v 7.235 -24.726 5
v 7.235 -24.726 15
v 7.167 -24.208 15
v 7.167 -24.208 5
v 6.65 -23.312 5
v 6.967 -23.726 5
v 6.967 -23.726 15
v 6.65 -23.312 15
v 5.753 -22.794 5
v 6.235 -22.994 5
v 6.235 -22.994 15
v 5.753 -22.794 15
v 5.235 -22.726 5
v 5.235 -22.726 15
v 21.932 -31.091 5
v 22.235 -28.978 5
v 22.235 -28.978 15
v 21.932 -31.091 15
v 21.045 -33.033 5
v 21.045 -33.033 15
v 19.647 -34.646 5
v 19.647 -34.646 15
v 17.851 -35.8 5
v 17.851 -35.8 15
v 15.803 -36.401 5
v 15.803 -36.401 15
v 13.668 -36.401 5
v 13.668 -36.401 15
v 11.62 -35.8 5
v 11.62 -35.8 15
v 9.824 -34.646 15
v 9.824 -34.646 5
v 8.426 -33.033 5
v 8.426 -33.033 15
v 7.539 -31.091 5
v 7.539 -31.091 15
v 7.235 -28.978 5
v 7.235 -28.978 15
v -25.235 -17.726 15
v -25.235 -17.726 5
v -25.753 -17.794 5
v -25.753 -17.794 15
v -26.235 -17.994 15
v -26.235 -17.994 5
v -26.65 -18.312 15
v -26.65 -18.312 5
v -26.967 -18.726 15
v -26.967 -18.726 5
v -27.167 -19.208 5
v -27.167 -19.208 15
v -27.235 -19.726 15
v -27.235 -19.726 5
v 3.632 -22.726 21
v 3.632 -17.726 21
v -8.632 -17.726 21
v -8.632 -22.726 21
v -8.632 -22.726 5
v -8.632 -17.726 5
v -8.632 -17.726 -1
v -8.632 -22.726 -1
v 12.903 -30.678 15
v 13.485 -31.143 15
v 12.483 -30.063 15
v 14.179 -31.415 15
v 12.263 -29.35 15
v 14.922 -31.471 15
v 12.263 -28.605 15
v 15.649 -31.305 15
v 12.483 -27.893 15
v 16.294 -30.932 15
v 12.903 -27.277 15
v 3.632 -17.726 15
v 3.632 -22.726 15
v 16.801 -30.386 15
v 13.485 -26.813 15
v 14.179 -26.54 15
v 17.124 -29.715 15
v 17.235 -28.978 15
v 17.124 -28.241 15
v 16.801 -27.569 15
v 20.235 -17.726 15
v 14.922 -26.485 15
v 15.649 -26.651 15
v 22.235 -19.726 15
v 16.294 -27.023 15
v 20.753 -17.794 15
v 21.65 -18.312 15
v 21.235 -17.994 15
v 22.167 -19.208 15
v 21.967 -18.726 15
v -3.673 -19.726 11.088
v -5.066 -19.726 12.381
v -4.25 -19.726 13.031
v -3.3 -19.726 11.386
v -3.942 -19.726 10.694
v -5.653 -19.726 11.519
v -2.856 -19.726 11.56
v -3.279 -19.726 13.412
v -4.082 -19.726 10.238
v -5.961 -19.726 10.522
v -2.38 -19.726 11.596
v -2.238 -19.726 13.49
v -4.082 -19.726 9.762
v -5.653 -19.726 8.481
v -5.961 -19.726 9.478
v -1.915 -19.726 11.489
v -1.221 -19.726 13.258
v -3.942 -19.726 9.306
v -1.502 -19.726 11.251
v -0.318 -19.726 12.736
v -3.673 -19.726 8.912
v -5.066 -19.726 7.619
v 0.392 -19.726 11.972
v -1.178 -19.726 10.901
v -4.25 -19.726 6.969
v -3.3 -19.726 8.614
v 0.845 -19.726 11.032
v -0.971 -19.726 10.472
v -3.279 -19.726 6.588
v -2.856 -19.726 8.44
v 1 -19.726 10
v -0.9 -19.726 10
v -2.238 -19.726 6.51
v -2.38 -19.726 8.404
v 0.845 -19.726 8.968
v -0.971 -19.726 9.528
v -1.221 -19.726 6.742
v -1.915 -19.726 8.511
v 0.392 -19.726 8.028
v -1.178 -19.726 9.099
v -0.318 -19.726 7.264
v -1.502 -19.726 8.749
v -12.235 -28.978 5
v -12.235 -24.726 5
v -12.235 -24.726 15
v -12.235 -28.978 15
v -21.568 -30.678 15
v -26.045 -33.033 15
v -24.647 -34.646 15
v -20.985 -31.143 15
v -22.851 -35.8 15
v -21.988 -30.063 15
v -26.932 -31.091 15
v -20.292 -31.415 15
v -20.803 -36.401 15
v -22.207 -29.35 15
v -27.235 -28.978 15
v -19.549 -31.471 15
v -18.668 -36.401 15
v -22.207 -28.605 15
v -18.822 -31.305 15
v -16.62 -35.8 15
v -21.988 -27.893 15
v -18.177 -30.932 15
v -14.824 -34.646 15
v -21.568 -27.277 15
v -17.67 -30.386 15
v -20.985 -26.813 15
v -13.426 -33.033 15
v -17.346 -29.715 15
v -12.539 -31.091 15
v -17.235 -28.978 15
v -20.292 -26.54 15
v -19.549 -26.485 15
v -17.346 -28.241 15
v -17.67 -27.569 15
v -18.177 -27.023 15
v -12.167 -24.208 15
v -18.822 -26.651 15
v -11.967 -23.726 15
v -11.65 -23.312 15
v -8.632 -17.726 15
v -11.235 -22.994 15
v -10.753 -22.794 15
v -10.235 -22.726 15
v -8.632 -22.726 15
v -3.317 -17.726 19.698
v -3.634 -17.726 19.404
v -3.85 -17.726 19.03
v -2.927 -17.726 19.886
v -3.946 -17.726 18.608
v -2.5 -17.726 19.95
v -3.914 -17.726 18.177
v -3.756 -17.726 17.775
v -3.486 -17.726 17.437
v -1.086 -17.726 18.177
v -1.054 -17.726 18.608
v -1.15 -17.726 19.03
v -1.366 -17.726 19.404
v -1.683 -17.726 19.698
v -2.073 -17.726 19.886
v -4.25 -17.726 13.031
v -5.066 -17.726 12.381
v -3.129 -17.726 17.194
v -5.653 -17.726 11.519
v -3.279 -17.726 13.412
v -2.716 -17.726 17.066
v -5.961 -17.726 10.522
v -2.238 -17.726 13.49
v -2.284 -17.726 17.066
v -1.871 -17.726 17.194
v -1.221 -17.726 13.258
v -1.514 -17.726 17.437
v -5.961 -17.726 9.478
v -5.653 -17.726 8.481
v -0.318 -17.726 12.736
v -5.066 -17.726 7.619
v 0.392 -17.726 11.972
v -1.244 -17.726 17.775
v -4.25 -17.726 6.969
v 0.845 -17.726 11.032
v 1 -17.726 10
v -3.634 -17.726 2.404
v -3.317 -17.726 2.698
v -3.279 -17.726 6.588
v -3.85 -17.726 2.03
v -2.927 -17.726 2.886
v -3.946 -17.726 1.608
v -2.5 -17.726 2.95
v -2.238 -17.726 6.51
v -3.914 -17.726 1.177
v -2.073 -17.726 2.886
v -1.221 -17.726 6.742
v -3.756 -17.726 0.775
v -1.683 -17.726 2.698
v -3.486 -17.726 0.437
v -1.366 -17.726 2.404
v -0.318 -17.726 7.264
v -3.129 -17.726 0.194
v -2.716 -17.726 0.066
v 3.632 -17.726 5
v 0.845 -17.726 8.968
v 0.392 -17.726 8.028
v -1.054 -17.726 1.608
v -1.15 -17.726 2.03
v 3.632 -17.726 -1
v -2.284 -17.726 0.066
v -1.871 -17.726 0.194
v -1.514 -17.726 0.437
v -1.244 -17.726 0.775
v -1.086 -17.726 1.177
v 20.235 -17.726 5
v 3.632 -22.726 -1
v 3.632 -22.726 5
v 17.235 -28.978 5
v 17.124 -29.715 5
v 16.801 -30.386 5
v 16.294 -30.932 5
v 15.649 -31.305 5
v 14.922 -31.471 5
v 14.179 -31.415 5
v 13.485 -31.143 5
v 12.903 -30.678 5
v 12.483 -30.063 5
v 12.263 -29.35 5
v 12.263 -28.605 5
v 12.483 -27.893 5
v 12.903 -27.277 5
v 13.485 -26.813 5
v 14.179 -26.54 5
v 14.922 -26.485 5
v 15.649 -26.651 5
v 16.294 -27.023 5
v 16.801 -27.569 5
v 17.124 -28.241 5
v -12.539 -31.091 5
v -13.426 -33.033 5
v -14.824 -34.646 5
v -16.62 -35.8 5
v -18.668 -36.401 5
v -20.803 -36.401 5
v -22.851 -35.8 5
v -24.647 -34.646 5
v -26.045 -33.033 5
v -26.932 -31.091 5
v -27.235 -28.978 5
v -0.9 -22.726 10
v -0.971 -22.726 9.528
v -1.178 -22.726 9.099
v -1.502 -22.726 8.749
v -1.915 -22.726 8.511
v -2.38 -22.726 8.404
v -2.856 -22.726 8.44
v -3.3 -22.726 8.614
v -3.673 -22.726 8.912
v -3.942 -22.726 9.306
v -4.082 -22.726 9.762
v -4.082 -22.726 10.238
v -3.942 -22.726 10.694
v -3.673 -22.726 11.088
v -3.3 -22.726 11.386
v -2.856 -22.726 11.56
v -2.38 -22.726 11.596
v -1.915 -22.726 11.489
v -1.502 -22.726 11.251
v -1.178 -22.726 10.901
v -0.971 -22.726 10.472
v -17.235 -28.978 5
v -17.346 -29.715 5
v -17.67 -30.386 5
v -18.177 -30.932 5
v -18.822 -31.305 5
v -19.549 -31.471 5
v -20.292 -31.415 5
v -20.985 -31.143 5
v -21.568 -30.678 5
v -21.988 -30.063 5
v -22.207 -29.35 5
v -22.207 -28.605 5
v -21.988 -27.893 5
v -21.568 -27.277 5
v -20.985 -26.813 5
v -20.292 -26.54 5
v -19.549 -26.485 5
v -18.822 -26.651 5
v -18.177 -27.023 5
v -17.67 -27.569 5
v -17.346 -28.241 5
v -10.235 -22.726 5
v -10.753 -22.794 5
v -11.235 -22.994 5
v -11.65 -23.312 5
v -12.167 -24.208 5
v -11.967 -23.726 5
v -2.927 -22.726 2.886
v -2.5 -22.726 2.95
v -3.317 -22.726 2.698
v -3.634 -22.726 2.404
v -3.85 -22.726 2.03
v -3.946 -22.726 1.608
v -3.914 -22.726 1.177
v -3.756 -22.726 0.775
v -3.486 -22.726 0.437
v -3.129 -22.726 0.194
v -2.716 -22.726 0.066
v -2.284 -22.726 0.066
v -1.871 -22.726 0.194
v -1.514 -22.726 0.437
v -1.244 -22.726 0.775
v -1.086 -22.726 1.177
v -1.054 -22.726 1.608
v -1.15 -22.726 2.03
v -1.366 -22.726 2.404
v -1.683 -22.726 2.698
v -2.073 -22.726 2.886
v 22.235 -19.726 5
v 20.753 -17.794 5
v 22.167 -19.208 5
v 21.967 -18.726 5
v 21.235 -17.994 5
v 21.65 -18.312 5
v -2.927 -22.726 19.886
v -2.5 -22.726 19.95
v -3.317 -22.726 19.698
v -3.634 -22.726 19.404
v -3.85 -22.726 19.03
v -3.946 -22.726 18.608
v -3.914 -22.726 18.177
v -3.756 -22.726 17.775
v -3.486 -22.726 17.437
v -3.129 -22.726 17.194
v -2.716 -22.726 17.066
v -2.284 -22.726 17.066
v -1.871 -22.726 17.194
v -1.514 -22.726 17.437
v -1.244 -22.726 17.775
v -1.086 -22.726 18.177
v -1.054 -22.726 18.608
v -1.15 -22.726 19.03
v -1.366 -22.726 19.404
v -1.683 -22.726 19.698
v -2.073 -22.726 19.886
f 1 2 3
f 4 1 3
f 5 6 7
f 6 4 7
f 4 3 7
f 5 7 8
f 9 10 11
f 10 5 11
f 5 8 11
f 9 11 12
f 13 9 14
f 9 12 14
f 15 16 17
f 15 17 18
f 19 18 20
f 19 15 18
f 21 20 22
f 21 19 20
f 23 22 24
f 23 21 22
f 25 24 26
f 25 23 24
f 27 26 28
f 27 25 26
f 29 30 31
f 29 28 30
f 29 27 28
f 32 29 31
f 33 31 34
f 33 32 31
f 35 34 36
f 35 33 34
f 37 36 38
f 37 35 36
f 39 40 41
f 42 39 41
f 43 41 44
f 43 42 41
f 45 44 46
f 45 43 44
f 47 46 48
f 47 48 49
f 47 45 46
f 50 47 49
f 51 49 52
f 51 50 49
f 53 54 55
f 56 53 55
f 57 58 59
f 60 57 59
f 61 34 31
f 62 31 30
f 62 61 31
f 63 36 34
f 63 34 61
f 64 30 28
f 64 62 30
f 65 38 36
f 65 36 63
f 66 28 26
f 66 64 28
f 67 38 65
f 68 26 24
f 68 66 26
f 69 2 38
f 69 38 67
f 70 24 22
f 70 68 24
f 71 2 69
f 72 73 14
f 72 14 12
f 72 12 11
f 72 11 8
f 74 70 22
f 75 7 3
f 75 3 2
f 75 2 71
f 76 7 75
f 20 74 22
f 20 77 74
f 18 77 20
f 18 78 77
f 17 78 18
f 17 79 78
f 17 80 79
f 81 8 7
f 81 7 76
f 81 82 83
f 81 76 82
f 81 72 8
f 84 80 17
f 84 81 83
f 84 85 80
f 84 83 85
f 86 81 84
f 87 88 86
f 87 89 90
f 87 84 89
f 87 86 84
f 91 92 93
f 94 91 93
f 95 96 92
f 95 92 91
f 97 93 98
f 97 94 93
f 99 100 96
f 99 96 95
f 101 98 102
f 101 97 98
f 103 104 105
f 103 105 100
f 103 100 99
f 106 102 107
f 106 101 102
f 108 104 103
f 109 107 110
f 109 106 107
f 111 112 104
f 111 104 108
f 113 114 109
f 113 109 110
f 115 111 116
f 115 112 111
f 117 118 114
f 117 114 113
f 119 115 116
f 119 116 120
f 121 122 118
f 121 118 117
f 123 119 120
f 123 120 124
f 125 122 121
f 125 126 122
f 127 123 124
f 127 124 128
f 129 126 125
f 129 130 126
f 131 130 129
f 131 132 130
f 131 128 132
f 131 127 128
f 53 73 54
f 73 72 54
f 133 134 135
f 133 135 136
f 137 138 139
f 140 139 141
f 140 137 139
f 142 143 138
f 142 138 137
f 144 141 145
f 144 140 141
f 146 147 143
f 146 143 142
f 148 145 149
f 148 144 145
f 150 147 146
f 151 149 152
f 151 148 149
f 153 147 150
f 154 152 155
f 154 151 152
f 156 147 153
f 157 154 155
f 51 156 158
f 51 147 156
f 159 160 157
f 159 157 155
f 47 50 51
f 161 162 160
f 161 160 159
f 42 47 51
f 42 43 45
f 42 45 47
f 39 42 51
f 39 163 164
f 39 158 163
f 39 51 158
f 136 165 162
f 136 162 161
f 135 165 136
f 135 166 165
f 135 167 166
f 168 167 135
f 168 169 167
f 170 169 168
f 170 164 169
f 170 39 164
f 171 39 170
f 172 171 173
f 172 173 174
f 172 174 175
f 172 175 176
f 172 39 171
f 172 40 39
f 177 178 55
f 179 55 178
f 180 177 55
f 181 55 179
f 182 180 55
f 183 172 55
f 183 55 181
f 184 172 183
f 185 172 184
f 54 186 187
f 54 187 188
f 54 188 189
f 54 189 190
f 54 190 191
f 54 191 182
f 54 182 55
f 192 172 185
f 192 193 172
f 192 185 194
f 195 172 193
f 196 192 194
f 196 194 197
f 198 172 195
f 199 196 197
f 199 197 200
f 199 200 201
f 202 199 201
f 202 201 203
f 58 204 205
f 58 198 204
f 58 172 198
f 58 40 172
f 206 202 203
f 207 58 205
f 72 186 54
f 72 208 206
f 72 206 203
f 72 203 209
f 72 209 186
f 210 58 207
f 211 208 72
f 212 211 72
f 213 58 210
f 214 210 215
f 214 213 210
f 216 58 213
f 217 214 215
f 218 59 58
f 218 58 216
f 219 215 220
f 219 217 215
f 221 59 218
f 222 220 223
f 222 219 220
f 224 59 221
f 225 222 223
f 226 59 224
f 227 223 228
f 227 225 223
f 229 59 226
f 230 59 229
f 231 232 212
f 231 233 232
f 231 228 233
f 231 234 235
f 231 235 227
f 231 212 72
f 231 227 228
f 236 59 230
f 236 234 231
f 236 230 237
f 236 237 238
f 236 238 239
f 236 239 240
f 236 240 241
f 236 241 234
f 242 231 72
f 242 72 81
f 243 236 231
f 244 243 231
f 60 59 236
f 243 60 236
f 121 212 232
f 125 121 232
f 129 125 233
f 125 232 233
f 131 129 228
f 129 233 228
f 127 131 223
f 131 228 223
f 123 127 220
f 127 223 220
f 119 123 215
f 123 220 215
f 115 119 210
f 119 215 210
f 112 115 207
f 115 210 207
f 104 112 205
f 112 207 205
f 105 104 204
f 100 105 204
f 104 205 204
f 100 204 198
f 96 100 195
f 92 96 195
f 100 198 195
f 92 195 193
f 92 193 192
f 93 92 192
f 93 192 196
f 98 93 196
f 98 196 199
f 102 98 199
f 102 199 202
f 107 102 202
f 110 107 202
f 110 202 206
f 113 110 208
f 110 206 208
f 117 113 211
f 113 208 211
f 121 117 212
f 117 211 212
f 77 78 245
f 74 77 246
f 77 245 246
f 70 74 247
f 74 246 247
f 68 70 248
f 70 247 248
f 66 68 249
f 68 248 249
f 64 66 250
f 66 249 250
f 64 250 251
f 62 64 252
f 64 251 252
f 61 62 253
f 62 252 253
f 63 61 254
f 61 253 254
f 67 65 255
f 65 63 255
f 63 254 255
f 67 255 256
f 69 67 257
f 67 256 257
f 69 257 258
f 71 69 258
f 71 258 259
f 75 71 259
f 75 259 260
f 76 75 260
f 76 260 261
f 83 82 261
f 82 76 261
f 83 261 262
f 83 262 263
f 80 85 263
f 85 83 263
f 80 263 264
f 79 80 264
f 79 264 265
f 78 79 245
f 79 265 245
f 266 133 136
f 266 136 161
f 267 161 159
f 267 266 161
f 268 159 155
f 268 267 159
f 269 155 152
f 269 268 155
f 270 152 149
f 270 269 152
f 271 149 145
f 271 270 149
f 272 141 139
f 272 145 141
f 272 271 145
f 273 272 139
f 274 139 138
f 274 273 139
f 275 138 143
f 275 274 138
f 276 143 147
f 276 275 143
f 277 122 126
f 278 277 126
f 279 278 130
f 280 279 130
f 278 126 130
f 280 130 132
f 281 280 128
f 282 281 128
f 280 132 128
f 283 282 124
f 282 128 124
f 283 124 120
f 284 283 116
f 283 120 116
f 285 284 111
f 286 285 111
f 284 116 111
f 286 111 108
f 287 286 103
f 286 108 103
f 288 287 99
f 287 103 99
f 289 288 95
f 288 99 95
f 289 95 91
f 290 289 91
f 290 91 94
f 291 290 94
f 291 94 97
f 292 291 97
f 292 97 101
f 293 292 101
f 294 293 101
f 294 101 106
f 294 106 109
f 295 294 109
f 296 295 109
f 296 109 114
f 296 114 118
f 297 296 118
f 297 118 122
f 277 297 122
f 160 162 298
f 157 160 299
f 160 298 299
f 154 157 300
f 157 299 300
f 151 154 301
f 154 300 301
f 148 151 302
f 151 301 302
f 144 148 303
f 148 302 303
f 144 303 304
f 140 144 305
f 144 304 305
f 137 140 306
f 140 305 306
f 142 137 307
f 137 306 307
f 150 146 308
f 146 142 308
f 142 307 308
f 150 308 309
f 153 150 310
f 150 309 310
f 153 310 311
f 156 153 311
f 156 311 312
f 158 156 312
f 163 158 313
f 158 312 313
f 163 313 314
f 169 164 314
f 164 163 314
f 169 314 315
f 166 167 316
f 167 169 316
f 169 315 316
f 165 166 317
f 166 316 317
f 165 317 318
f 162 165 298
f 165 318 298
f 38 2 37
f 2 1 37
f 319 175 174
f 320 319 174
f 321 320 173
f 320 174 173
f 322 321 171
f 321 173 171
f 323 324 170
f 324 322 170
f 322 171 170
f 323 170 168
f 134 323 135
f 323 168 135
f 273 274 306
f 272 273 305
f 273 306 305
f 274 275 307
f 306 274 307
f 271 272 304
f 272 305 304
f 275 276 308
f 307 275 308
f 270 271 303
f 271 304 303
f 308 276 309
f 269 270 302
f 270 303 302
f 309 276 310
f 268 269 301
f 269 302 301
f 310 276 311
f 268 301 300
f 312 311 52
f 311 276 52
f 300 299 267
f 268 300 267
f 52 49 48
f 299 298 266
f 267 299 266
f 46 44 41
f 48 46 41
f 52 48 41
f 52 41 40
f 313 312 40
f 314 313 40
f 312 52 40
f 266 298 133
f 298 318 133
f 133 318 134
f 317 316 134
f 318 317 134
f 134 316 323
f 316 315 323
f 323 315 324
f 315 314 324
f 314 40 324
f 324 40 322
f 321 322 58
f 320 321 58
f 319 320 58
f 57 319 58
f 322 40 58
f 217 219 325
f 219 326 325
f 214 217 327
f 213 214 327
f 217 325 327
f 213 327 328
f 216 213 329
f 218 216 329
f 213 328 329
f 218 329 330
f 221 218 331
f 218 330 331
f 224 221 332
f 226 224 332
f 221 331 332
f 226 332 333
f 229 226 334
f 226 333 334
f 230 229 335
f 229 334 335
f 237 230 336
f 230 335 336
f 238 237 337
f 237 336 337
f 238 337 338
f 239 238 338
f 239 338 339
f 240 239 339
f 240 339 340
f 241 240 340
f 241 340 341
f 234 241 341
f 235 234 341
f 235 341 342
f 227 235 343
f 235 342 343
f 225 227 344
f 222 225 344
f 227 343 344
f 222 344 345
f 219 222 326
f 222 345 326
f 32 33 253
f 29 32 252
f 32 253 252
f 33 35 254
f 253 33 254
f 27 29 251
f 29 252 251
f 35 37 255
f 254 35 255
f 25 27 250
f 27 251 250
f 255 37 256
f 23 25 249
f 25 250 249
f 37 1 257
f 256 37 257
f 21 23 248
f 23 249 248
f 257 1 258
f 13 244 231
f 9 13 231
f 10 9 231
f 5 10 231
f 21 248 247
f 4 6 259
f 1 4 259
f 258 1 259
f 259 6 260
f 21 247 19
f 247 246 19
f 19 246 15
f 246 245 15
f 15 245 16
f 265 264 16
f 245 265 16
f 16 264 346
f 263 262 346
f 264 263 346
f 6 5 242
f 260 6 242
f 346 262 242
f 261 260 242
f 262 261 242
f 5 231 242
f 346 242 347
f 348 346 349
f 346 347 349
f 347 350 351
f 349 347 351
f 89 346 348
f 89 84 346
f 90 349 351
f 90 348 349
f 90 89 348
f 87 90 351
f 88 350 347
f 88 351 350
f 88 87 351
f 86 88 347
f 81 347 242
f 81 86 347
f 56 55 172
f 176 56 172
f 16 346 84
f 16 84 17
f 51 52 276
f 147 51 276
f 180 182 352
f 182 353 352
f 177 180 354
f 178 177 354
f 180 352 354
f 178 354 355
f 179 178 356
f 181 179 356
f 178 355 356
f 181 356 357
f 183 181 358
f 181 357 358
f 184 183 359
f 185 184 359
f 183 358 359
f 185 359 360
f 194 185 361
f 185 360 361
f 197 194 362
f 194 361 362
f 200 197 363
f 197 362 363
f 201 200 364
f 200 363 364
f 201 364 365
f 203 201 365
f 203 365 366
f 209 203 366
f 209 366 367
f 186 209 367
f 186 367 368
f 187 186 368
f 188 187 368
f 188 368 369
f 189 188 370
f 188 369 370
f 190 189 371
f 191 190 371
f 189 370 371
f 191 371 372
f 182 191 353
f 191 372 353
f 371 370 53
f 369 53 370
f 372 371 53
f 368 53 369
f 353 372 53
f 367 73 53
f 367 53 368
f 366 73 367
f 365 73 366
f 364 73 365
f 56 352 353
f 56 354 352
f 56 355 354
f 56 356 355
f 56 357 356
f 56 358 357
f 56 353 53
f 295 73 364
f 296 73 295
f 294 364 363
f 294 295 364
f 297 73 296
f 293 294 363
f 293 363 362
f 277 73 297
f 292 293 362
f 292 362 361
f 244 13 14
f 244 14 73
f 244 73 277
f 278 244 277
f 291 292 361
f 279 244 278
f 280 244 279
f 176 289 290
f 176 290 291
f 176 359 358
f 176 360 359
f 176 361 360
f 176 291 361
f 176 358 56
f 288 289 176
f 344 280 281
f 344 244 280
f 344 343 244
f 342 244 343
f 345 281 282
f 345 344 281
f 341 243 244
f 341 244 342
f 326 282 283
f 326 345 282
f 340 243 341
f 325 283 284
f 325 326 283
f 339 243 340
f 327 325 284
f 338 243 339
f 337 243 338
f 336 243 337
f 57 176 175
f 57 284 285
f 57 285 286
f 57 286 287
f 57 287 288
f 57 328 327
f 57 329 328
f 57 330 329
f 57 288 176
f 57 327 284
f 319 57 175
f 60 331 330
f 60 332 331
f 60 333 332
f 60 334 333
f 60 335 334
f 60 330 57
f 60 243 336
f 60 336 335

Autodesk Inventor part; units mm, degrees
ref_plane "YZ Plane" through (0, 0, 0) normal (1, 0, 0) x (0, 1, 0)
ref_plane "XZ Plane" through (0, 0, 0) normal (0, 1, 0) x (-1, 0, 0)
ref_plane "XY Plane" through (0, 0, 0) normal (0, 0, 1) x (1, 0, 0)
sketch "Szkic1" plane through (0, 0, 0) normal (0, 0, 1) x (1, 0, 0)
  line L0 (-2.5, 0) -> (-27.5, 0)
  line L1 (-27.5, 0) -> (-19.7354, -28.9778)
  line L2 (-27.5, 0) -> (2.5, 0) construction
  line L3 (-27.5, 0) -> (-37.3351, 36.7052)
  line L4 (-27.5, 0) -> (10.5, 0) construction
  line L5 (-37.3351, 36.7052) -> (-37.3351, 54.7052)
  line L6 (-37.3351, 54.7052) -> (-2.5, 54.7052)
  line L7 (-37.3351, 54.7052) -> (-27.3351, 72.0257)
  line L8 (-37.3351, 54.7052) -> (-17.3351, 54.7052) construction
  line L9 (-37.3351, 54.7052) -> (-27.3351, 37.3847)
  line L10 (-37.3351, 54.7052) -> (-17.3351, 54.7052) construction
  circle A0 centre (-27.5, 0) radius 1.5
  line L11 (-2.5, 0) -> (-2.5, -12)
  line L12 (-2.5, -12) -> (-27.5, -12)
  line L13 (-27.5, -12) -> (-19.7354, -28.9778)
  line L14 (-27.5, -12) -> (-48.0171, 32.862)
  line L15 (-48.0171, 32.862) -> (-51.0127, 50.611)
  line L16 (-48.0171, 32.862) -> (-30.0171, 32.862) construction
  line L17 (-51.0127, 50.611) -> (-38.2696, 35.1962)
  line L18 (-51.0127, 50.611) -> (-31.0127, 50.611) construction
  line L19 (-51.0127, 50.611) -> (-44.0347, 69.3542)
  line L20 (-51.0127, 50.611) -> (-31.0127, 50.611) construction
  circle A1 centre (-27.5, -12) radius 1.5
  line L21 (-19.7354, -28.9778) -> (0, -28.9778)
  circle A2 centre (-19.7354, -28.9778) radius 2.5
  line L22 (-22.2354, -28.9778) -> (-27.2354, -28.9778)
  line L23 (17.2354, -28.9778) -> (22.2354, -28.9778)
  circle A3 centre (14.7354, -28.9778) radius 2.5
  line L24 (22.5, -12) -> (14.7354, -28.9778)
  line L25 (14.7354, -28.9778) -> (0, -28.9778)
  line L26 (-2.5, -12) -> (22.5, -12)
  line L27 (32.3351, 54.7052) -> (22.3351, 37.3847)
  line L28 (32.3351, 36.7052) -> (32.3351, 54.7052)
  line L29 (46.0127, 50.611) -> (33.2696, 35.1962)
  line L30 (43.0171, 32.862) -> (46.0127, 50.611)
  line L31 (43.0171, 32.862) -> (25.0171, 32.862) construction
  circle A4 centre (22.5, 0) radius 1.5
  line L32 (22.5, 0) -> (32.3351, 36.7052)
  circle A5 centre (22.5, -12) radius 1.5
  line L33 (22.5, -12) -> (43.0171, 32.862)
  line L34 (-2.5, 0) -> (22.5, 0)
  line L35 (22.5, 0) -> (14.7354, -28.9778)
  line L36 (22.5, 0) -> (-7.5, 0) construction
  line L37 (22.5, 0) -> (-15.5, 0) construction
  line L38 (46.0127, 50.611) -> (26.0127, 50.611) construction
  line L39 (46.0127, 50.611) -> (26.0127, 50.611) construction
  line L40 (32.3351, 54.7052) -> (12.3351, 54.7052) construction
  line L41 (32.3351, 54.7052) -> (12.3351, 54.7052) construction
  line L42 (32.3351, 54.7052) -> (-2.5, 54.7052)
  line L43 (46.0127, 50.611) -> (39.0347, 69.3542)
  line L44 (32.3351, 54.7052) -> (22.3351, 72.0257)
  line L45 (-19.7354, -31.4778) -> (-19.7354, -36.4778)
  line L46 (-19.7354, -36.4778) -> (0, -36.4778)
  line L47 (-19.7354, -36.4778) -> (-22.2354, -36.4778)
  line L48 (-27.2354, -28.9778) -> (-27.2354, -31.4778)
  line L49 (-19.7354, -26.4778) -> (-19.7354, -21.4778)
  line L50 (-19.7354, -21.4778) -> (-22.2354, -21.4778)
  line L51 (-27.2354, -26.4778) -> (-27.2354, -28.9778)
  line L52 (-19.7354, -21.4778) -> (0, -21.4778)
  line L53 (22.5, 0) -> (14.7354, -28.9778)
  line L54 (22.5, -12) -> (14.7354, -28.9778)
  line L55 (14.7354, -28.9778) -> (-5, -28.9778)
  circle A6 centre (14.7354, -28.9778) radius 2.5
  line L56 (17.2354, -28.9778) -> (22.2354, -28.9778)
  line L57 (-19.7354, -28.9778) -> (-5, -28.9778)
  line L58 (14.7354, -31.4778) -> (14.7354, -36.4778)
  line L59 (14.7354, -36.4778) -> (-5, -36.4778)
  line L60 (14.7354, -36.4778) -> (17.2354, -36.4778)
  line L61 (22.2354, -28.9778) -> (22.2354, -31.4778)
  line L62 (14.7354, -26.4778) -> (14.7354, -21.4778)
  line L63 (14.7354, -21.4778) -> (17.2354, -21.4778)
  line L64 (22.2354, -26.4778) -> (22.2354, -28.9778)
  line L65 (14.7354, -21.4778) -> (-5, -21.4778)
  arc A7 (-22.2354, -21.4778) -> (-27.2354, -26.4778) centre (-22.2354, -26.4778) ccw
  arc A8 (-27.2354, -31.4778) -> (-22.2354, -36.4778) centre (-22.2354, -31.4778) ccw
  arc A9 (22.2354, -26.4778) -> (17.2354, -21.4778) centre (17.2354, -26.4778) ccw
  arc A10 (17.2354, -36.4778) -> (22.2354, -31.4778) centre (17.2354, -31.4778) ccw
  point P0 (0, 0)
  point P1 (-27.2354, -36.4778)
  point P2 (-27.2354, -21.4778)
  point P3 (22.2354, -36.4778)
  point P4 (22.2354, -21.4778)
  dimension "d0" = 25
  dimension "d1" = 30
  dimension "d2" = 75
  dimension "d3" = 38
  dimension "d4" = 105
  dimension "d5" = 18
  dimension "d6" = 20
  dimension "d7" = 60
  dimension "d8" = 20
  dimension "d9" = 60
  dimension "d10" = 3
  dimension "d11" = 12
  dimension "d12" = 25
  dimension "d13" = 49.331
  dimension "d14" = 18
  dimension "d15" = 99.58
  dimension "d16" = 20
  dimension "d17" = 50.42
  dimension "d18" = 20
  dimension "d19" = 69.58
  dimension "d20" = 3
  dimension "d22" = 5
  dimension "d23" = 5
  dimension "d28" = 5
  dimension "d29" = 5
  dimension "d30" = 5
  dimension "d31" = 5
  dimension "d32" = 5
  dimension "d33" = 5
extrude "Wyciągnięcie proste1" add sketch "Szkic1" along normal mid plane 10 contours L50 L49 A2 L1 | L1 A2 L13 A7 L50 | L63 A9 L24 A3 L35 | L35 A3 L62 L63 | L52 L65 L62 A3 L25 L21 A2 L49 | A2 L22 L51 A7 L13 | A9 L64 L23 A3 L24 | L21 L25 A3 L58 L59 L46 L45 A2 | A2 L45 L47 A8 L48 L22 | L23 L61 A10 L60 L58 A3
sketch "Szkic2" plane through (0, 0, 5) normal (0, 0, 1) x (1, 0, 0)
  circle A0 centre (-19.7354, -28.9778) radius 2.5 projected
  circle A1 centre (-19.7354, -28.9778) radius 2.5
  circle A2 centre (14.7354, -28.9778) radius 2.5 projected
  circle A3 centre (14.7354, -28.9778) radius 2.5
  point P0 (0, 0)
extrude "Wyciągnięcie proste2" add sketch "Szkic2" along normal blind 10 and the other way blind 20
sketch "Szkic3" plane through (-22.2354, -36.4778, 5) normal (0, -1, 0) x (1, 0, 0)
  line L0 (44.4709, -10) -> (44.4709, 0) projected
  line L1 (44.4709, -5) -> (-5, -5)
  line L2 (-5, -10) -> (-5, 0) projected
  line L3 (0, 0) -> (39.4709, 0) projected
  line L4 (19.7354, 0) -> (19.7354, -10)
  circle A0 centre (19.7354, -5) radius 1.6
  point P0 (22.2354, -5)
  dimension "d40" = 3.2
extrude "Wyciągnięcie proste3" cut sketch "Szkic3" against normal through all
sketch "Szkic4" plane through (14.7354, -28.9778, 15) normal (0, 0, 1) x (1, 0, 0)
  circle A0 centre (0, 0) radius 2.5
  circle A1 centre (-34.4709, 0) radius 2.5 projected
  circle A2 centre (-34.4709, 0) radius 2.5
  point P0 (-14.7354, 28.9778)
extrude "Wyciągnięcie proste4" cut sketch "Szkic4" against normal through all
sketch "Szkic5" plane through (0, 0, 5) normal (0, 0, 1) x (1, 0, 0)
  line L0 (-22.2354, -21.4778) -> (17.2354, -21.4778) projected
  line L1 (0, -21.4778) -> (0, -22.7258)
  line L2 (0, -21.4778) -> (1.248, -21.4778) construction
  circle A0 centre (14.7354, -28.9778) radius 2.5 projected
  circle A1 centre (14.7354, -28.9778) radius 7.5
  circle A2 centre (-19.7354, -28.9778) radius 2.5 projected
  circle A3 centre (-19.7354, -28.9778) radius 7.5
  line L3 (0, -22.7258) -> (7.2354, -22.7258)
  line L4 (7.2354, -22.7258) -> (7.2354, -28.9778)
  line L5 (0, -22.7258) -> (-12.2354, -22.7258)
  line L6 (-12.2354, -22.7258) -> (-12.2354, -28.9778)
  line L7 (22.2354, -28.9778) -> (22.2354, -21.4778)
  line L8 (22.2354, -26.4778) -> (22.2354, -31.4778) projected
  line L9 (7.2354, -22.7258) -> (7.2354, -12.7258)
  line L10 (7.2354, -12.7258) -> (-12.2354, -12.7258)
  line L11 (-12.2354, -12.7258) -> (-27.2354, -12.7258)
  line L12 (-27.2354, -12.7258) -> (-27.2354, -28.9778)
  line L13 (22.2354, -21.4778) -> (22.2354, -12.7258)
  line L14 (22.2354, -12.7258) -> (7.2354, -12.7258)
  line L15 (-27.2354, -12.7258) -> (-27.2354, -17.7258)
  line L16 (-27.2354, -12.7258) -> (-27.2354, -17.7258)
  line L17 (-27.2354, -17.7258) -> (22.2354, -17.7258)
  point P0 (0, 0)
  dimension "d45" = 1.248
  dimension "d46" = 270
  dimension "d47" = 7.5
  dimension "d48" = 10
extrude "Wyciągnięcie proste5" add sketch "Szkic5" along normal blind 10 contours A3 L12 L17 L9 L0 | L0 L1 L5 L6 A3 | A3 | L0 L9 L3 L1 | L9 L17 L13 L7 A1 L0 | L0 A1 L4 L9 | A1
sketch "Szkic6" plane through (0, 0, -5) normal (0, 0, -1) x (-1, 0, 0)
  line L0 (22.2354, -21.4778) -> (-17.2354, -21.4778) projected
  arc A0 (-17.2354, -21.4778) -> (-22.2354, -26.4778) centre (-17.2354, -26.4778) ccw projected
  line L1 (-22.2354, -26.4778) -> (-22.2354, -31.4778) projected
  arc A1 (-22.2354, -31.4778) -> (-17.2354, -36.4778) centre (-17.2354, -31.4778) ccw projected
  line L2 (-17.2354, -36.4778) -> (22.2354, -36.4778) projected
  arc A2 (22.2354, -36.4778) -> (27.2354, -31.4778) centre (22.2354, -31.4778) ccw projected
  line L3 (27.2354, -31.4778) -> (27.2354, -26.4778) projected
  arc A3 (27.2354, -26.4778) -> (22.2354, -21.4778) centre (22.2354, -26.4778) ccw projected
  point P0 (0, 0)
extrude "Wyciągnięcie proste6" cut sketch "Szkic6" against normal blind 10
fillet "Zaokrąglenie1" radius 2 4 edges at (-12.2354, -22.7258, 10) (7.2354, -22.7258, 10) (22.2354, -17.7258, 10) (-27.2354, -17.7258, 10)
sketch "Szkic7" plane through (-25.2354, -17.7258, 5) normal (0, 1, 0) x (1, 0, 0)
  line L0 (15, -10) -> (30.4709, -10) projected
  line L1 (22.7354, -10) -> (28.8669, -10)
  line L2 (28.8669, -10) -> (28.8669, -16)
  line L3 (28.8669, -16) -> (16.6039, -16)
  line L4 (16.6039, -16) -> (16.6039, -10)
  line L5 (22.7354, -10) -> (16.6039, -10)
  line L6 (16.6039, -10) -> (16.6039, 0)
  line L7 (22.7354, 6) -> (28.8669, 6)
  line L8 (28.8669, 6) -> (28.8669, 0)
  line L9 (28.8669, 0) -> (16.6039, 0)
  line L10 (16.6039, 0) -> (16.6039, 6)
  line L11 (22.7354, 6) -> (16.6039, 6)
  point P0 (25.2354, 5)
  dimension "d54" = 6.1315
  dimension "d55" = 6
  dimension "d56" = 12.263
  dimension "d57" = 10
  dimension "d58" = 6.1315
  dimension "d59" = 6
  dimension "d60" = 12.263
extrude "Wyciągnięcie proste7" add sketch "Szkic7" against normal up to surface (5 mm away)
sketch "Szkic8" plane through (-25.2354, -17.7258, 15) normal (0, 1, 0) x (1, 0, 0)
  line L0 (28.8669, 16) -> (16.6039, 16) projected
  line L1 (22.7354, 16) -> (22.7354, -6)
  line L2 (16.6039, -6) -> (28.8669, -6) projected
  circle A0 centre (22.7354, 5) radius 1.6
  point P0 (25.2354, 15)
  dimension "d64" = 3.2
extrude "Wyciągnięcie proste8" cut sketch "Szkic8" against normal blind 10
sketch "Szkic9" plane through (-25.2354, -17.7258, 15) normal (0, 1, 0) x (1, 0, 0)
  point P0 (22.7354, 13.5)
hole "Otwór1" at (-2.5, -17.7258, 1.5) direction (0, -1, 0) diameter 2.9 end through all
sketch "Szkic10" plane through (-25.2354, -17.7258, 15) normal (0, 1, 0) x (1, 0, 0)
  point P0 (22.7354, -3.5)
hole "Otwór2" at (-2.5, -17.7258, 18.5) direction (0, -1, 0) diameter 2.9 end through all
sketch "Szkic11" plane through (-25.2354, -17.7258, 15) normal (0, 1, 0) x (1, 0, 0)
  circle A0 centre (22.7354, 5) radius 1.6 projected
  circle A1 centre (22.7354, 5) radius 3.5
  point P0 (25.2354, 15)
  dimension "d81" = 7
extrude "Wyciągnięcie proste9" cut sketch "Szkic11" against normal blind 2
properties part number "Podstawa chwytaka" material "Stal, węglowa"
